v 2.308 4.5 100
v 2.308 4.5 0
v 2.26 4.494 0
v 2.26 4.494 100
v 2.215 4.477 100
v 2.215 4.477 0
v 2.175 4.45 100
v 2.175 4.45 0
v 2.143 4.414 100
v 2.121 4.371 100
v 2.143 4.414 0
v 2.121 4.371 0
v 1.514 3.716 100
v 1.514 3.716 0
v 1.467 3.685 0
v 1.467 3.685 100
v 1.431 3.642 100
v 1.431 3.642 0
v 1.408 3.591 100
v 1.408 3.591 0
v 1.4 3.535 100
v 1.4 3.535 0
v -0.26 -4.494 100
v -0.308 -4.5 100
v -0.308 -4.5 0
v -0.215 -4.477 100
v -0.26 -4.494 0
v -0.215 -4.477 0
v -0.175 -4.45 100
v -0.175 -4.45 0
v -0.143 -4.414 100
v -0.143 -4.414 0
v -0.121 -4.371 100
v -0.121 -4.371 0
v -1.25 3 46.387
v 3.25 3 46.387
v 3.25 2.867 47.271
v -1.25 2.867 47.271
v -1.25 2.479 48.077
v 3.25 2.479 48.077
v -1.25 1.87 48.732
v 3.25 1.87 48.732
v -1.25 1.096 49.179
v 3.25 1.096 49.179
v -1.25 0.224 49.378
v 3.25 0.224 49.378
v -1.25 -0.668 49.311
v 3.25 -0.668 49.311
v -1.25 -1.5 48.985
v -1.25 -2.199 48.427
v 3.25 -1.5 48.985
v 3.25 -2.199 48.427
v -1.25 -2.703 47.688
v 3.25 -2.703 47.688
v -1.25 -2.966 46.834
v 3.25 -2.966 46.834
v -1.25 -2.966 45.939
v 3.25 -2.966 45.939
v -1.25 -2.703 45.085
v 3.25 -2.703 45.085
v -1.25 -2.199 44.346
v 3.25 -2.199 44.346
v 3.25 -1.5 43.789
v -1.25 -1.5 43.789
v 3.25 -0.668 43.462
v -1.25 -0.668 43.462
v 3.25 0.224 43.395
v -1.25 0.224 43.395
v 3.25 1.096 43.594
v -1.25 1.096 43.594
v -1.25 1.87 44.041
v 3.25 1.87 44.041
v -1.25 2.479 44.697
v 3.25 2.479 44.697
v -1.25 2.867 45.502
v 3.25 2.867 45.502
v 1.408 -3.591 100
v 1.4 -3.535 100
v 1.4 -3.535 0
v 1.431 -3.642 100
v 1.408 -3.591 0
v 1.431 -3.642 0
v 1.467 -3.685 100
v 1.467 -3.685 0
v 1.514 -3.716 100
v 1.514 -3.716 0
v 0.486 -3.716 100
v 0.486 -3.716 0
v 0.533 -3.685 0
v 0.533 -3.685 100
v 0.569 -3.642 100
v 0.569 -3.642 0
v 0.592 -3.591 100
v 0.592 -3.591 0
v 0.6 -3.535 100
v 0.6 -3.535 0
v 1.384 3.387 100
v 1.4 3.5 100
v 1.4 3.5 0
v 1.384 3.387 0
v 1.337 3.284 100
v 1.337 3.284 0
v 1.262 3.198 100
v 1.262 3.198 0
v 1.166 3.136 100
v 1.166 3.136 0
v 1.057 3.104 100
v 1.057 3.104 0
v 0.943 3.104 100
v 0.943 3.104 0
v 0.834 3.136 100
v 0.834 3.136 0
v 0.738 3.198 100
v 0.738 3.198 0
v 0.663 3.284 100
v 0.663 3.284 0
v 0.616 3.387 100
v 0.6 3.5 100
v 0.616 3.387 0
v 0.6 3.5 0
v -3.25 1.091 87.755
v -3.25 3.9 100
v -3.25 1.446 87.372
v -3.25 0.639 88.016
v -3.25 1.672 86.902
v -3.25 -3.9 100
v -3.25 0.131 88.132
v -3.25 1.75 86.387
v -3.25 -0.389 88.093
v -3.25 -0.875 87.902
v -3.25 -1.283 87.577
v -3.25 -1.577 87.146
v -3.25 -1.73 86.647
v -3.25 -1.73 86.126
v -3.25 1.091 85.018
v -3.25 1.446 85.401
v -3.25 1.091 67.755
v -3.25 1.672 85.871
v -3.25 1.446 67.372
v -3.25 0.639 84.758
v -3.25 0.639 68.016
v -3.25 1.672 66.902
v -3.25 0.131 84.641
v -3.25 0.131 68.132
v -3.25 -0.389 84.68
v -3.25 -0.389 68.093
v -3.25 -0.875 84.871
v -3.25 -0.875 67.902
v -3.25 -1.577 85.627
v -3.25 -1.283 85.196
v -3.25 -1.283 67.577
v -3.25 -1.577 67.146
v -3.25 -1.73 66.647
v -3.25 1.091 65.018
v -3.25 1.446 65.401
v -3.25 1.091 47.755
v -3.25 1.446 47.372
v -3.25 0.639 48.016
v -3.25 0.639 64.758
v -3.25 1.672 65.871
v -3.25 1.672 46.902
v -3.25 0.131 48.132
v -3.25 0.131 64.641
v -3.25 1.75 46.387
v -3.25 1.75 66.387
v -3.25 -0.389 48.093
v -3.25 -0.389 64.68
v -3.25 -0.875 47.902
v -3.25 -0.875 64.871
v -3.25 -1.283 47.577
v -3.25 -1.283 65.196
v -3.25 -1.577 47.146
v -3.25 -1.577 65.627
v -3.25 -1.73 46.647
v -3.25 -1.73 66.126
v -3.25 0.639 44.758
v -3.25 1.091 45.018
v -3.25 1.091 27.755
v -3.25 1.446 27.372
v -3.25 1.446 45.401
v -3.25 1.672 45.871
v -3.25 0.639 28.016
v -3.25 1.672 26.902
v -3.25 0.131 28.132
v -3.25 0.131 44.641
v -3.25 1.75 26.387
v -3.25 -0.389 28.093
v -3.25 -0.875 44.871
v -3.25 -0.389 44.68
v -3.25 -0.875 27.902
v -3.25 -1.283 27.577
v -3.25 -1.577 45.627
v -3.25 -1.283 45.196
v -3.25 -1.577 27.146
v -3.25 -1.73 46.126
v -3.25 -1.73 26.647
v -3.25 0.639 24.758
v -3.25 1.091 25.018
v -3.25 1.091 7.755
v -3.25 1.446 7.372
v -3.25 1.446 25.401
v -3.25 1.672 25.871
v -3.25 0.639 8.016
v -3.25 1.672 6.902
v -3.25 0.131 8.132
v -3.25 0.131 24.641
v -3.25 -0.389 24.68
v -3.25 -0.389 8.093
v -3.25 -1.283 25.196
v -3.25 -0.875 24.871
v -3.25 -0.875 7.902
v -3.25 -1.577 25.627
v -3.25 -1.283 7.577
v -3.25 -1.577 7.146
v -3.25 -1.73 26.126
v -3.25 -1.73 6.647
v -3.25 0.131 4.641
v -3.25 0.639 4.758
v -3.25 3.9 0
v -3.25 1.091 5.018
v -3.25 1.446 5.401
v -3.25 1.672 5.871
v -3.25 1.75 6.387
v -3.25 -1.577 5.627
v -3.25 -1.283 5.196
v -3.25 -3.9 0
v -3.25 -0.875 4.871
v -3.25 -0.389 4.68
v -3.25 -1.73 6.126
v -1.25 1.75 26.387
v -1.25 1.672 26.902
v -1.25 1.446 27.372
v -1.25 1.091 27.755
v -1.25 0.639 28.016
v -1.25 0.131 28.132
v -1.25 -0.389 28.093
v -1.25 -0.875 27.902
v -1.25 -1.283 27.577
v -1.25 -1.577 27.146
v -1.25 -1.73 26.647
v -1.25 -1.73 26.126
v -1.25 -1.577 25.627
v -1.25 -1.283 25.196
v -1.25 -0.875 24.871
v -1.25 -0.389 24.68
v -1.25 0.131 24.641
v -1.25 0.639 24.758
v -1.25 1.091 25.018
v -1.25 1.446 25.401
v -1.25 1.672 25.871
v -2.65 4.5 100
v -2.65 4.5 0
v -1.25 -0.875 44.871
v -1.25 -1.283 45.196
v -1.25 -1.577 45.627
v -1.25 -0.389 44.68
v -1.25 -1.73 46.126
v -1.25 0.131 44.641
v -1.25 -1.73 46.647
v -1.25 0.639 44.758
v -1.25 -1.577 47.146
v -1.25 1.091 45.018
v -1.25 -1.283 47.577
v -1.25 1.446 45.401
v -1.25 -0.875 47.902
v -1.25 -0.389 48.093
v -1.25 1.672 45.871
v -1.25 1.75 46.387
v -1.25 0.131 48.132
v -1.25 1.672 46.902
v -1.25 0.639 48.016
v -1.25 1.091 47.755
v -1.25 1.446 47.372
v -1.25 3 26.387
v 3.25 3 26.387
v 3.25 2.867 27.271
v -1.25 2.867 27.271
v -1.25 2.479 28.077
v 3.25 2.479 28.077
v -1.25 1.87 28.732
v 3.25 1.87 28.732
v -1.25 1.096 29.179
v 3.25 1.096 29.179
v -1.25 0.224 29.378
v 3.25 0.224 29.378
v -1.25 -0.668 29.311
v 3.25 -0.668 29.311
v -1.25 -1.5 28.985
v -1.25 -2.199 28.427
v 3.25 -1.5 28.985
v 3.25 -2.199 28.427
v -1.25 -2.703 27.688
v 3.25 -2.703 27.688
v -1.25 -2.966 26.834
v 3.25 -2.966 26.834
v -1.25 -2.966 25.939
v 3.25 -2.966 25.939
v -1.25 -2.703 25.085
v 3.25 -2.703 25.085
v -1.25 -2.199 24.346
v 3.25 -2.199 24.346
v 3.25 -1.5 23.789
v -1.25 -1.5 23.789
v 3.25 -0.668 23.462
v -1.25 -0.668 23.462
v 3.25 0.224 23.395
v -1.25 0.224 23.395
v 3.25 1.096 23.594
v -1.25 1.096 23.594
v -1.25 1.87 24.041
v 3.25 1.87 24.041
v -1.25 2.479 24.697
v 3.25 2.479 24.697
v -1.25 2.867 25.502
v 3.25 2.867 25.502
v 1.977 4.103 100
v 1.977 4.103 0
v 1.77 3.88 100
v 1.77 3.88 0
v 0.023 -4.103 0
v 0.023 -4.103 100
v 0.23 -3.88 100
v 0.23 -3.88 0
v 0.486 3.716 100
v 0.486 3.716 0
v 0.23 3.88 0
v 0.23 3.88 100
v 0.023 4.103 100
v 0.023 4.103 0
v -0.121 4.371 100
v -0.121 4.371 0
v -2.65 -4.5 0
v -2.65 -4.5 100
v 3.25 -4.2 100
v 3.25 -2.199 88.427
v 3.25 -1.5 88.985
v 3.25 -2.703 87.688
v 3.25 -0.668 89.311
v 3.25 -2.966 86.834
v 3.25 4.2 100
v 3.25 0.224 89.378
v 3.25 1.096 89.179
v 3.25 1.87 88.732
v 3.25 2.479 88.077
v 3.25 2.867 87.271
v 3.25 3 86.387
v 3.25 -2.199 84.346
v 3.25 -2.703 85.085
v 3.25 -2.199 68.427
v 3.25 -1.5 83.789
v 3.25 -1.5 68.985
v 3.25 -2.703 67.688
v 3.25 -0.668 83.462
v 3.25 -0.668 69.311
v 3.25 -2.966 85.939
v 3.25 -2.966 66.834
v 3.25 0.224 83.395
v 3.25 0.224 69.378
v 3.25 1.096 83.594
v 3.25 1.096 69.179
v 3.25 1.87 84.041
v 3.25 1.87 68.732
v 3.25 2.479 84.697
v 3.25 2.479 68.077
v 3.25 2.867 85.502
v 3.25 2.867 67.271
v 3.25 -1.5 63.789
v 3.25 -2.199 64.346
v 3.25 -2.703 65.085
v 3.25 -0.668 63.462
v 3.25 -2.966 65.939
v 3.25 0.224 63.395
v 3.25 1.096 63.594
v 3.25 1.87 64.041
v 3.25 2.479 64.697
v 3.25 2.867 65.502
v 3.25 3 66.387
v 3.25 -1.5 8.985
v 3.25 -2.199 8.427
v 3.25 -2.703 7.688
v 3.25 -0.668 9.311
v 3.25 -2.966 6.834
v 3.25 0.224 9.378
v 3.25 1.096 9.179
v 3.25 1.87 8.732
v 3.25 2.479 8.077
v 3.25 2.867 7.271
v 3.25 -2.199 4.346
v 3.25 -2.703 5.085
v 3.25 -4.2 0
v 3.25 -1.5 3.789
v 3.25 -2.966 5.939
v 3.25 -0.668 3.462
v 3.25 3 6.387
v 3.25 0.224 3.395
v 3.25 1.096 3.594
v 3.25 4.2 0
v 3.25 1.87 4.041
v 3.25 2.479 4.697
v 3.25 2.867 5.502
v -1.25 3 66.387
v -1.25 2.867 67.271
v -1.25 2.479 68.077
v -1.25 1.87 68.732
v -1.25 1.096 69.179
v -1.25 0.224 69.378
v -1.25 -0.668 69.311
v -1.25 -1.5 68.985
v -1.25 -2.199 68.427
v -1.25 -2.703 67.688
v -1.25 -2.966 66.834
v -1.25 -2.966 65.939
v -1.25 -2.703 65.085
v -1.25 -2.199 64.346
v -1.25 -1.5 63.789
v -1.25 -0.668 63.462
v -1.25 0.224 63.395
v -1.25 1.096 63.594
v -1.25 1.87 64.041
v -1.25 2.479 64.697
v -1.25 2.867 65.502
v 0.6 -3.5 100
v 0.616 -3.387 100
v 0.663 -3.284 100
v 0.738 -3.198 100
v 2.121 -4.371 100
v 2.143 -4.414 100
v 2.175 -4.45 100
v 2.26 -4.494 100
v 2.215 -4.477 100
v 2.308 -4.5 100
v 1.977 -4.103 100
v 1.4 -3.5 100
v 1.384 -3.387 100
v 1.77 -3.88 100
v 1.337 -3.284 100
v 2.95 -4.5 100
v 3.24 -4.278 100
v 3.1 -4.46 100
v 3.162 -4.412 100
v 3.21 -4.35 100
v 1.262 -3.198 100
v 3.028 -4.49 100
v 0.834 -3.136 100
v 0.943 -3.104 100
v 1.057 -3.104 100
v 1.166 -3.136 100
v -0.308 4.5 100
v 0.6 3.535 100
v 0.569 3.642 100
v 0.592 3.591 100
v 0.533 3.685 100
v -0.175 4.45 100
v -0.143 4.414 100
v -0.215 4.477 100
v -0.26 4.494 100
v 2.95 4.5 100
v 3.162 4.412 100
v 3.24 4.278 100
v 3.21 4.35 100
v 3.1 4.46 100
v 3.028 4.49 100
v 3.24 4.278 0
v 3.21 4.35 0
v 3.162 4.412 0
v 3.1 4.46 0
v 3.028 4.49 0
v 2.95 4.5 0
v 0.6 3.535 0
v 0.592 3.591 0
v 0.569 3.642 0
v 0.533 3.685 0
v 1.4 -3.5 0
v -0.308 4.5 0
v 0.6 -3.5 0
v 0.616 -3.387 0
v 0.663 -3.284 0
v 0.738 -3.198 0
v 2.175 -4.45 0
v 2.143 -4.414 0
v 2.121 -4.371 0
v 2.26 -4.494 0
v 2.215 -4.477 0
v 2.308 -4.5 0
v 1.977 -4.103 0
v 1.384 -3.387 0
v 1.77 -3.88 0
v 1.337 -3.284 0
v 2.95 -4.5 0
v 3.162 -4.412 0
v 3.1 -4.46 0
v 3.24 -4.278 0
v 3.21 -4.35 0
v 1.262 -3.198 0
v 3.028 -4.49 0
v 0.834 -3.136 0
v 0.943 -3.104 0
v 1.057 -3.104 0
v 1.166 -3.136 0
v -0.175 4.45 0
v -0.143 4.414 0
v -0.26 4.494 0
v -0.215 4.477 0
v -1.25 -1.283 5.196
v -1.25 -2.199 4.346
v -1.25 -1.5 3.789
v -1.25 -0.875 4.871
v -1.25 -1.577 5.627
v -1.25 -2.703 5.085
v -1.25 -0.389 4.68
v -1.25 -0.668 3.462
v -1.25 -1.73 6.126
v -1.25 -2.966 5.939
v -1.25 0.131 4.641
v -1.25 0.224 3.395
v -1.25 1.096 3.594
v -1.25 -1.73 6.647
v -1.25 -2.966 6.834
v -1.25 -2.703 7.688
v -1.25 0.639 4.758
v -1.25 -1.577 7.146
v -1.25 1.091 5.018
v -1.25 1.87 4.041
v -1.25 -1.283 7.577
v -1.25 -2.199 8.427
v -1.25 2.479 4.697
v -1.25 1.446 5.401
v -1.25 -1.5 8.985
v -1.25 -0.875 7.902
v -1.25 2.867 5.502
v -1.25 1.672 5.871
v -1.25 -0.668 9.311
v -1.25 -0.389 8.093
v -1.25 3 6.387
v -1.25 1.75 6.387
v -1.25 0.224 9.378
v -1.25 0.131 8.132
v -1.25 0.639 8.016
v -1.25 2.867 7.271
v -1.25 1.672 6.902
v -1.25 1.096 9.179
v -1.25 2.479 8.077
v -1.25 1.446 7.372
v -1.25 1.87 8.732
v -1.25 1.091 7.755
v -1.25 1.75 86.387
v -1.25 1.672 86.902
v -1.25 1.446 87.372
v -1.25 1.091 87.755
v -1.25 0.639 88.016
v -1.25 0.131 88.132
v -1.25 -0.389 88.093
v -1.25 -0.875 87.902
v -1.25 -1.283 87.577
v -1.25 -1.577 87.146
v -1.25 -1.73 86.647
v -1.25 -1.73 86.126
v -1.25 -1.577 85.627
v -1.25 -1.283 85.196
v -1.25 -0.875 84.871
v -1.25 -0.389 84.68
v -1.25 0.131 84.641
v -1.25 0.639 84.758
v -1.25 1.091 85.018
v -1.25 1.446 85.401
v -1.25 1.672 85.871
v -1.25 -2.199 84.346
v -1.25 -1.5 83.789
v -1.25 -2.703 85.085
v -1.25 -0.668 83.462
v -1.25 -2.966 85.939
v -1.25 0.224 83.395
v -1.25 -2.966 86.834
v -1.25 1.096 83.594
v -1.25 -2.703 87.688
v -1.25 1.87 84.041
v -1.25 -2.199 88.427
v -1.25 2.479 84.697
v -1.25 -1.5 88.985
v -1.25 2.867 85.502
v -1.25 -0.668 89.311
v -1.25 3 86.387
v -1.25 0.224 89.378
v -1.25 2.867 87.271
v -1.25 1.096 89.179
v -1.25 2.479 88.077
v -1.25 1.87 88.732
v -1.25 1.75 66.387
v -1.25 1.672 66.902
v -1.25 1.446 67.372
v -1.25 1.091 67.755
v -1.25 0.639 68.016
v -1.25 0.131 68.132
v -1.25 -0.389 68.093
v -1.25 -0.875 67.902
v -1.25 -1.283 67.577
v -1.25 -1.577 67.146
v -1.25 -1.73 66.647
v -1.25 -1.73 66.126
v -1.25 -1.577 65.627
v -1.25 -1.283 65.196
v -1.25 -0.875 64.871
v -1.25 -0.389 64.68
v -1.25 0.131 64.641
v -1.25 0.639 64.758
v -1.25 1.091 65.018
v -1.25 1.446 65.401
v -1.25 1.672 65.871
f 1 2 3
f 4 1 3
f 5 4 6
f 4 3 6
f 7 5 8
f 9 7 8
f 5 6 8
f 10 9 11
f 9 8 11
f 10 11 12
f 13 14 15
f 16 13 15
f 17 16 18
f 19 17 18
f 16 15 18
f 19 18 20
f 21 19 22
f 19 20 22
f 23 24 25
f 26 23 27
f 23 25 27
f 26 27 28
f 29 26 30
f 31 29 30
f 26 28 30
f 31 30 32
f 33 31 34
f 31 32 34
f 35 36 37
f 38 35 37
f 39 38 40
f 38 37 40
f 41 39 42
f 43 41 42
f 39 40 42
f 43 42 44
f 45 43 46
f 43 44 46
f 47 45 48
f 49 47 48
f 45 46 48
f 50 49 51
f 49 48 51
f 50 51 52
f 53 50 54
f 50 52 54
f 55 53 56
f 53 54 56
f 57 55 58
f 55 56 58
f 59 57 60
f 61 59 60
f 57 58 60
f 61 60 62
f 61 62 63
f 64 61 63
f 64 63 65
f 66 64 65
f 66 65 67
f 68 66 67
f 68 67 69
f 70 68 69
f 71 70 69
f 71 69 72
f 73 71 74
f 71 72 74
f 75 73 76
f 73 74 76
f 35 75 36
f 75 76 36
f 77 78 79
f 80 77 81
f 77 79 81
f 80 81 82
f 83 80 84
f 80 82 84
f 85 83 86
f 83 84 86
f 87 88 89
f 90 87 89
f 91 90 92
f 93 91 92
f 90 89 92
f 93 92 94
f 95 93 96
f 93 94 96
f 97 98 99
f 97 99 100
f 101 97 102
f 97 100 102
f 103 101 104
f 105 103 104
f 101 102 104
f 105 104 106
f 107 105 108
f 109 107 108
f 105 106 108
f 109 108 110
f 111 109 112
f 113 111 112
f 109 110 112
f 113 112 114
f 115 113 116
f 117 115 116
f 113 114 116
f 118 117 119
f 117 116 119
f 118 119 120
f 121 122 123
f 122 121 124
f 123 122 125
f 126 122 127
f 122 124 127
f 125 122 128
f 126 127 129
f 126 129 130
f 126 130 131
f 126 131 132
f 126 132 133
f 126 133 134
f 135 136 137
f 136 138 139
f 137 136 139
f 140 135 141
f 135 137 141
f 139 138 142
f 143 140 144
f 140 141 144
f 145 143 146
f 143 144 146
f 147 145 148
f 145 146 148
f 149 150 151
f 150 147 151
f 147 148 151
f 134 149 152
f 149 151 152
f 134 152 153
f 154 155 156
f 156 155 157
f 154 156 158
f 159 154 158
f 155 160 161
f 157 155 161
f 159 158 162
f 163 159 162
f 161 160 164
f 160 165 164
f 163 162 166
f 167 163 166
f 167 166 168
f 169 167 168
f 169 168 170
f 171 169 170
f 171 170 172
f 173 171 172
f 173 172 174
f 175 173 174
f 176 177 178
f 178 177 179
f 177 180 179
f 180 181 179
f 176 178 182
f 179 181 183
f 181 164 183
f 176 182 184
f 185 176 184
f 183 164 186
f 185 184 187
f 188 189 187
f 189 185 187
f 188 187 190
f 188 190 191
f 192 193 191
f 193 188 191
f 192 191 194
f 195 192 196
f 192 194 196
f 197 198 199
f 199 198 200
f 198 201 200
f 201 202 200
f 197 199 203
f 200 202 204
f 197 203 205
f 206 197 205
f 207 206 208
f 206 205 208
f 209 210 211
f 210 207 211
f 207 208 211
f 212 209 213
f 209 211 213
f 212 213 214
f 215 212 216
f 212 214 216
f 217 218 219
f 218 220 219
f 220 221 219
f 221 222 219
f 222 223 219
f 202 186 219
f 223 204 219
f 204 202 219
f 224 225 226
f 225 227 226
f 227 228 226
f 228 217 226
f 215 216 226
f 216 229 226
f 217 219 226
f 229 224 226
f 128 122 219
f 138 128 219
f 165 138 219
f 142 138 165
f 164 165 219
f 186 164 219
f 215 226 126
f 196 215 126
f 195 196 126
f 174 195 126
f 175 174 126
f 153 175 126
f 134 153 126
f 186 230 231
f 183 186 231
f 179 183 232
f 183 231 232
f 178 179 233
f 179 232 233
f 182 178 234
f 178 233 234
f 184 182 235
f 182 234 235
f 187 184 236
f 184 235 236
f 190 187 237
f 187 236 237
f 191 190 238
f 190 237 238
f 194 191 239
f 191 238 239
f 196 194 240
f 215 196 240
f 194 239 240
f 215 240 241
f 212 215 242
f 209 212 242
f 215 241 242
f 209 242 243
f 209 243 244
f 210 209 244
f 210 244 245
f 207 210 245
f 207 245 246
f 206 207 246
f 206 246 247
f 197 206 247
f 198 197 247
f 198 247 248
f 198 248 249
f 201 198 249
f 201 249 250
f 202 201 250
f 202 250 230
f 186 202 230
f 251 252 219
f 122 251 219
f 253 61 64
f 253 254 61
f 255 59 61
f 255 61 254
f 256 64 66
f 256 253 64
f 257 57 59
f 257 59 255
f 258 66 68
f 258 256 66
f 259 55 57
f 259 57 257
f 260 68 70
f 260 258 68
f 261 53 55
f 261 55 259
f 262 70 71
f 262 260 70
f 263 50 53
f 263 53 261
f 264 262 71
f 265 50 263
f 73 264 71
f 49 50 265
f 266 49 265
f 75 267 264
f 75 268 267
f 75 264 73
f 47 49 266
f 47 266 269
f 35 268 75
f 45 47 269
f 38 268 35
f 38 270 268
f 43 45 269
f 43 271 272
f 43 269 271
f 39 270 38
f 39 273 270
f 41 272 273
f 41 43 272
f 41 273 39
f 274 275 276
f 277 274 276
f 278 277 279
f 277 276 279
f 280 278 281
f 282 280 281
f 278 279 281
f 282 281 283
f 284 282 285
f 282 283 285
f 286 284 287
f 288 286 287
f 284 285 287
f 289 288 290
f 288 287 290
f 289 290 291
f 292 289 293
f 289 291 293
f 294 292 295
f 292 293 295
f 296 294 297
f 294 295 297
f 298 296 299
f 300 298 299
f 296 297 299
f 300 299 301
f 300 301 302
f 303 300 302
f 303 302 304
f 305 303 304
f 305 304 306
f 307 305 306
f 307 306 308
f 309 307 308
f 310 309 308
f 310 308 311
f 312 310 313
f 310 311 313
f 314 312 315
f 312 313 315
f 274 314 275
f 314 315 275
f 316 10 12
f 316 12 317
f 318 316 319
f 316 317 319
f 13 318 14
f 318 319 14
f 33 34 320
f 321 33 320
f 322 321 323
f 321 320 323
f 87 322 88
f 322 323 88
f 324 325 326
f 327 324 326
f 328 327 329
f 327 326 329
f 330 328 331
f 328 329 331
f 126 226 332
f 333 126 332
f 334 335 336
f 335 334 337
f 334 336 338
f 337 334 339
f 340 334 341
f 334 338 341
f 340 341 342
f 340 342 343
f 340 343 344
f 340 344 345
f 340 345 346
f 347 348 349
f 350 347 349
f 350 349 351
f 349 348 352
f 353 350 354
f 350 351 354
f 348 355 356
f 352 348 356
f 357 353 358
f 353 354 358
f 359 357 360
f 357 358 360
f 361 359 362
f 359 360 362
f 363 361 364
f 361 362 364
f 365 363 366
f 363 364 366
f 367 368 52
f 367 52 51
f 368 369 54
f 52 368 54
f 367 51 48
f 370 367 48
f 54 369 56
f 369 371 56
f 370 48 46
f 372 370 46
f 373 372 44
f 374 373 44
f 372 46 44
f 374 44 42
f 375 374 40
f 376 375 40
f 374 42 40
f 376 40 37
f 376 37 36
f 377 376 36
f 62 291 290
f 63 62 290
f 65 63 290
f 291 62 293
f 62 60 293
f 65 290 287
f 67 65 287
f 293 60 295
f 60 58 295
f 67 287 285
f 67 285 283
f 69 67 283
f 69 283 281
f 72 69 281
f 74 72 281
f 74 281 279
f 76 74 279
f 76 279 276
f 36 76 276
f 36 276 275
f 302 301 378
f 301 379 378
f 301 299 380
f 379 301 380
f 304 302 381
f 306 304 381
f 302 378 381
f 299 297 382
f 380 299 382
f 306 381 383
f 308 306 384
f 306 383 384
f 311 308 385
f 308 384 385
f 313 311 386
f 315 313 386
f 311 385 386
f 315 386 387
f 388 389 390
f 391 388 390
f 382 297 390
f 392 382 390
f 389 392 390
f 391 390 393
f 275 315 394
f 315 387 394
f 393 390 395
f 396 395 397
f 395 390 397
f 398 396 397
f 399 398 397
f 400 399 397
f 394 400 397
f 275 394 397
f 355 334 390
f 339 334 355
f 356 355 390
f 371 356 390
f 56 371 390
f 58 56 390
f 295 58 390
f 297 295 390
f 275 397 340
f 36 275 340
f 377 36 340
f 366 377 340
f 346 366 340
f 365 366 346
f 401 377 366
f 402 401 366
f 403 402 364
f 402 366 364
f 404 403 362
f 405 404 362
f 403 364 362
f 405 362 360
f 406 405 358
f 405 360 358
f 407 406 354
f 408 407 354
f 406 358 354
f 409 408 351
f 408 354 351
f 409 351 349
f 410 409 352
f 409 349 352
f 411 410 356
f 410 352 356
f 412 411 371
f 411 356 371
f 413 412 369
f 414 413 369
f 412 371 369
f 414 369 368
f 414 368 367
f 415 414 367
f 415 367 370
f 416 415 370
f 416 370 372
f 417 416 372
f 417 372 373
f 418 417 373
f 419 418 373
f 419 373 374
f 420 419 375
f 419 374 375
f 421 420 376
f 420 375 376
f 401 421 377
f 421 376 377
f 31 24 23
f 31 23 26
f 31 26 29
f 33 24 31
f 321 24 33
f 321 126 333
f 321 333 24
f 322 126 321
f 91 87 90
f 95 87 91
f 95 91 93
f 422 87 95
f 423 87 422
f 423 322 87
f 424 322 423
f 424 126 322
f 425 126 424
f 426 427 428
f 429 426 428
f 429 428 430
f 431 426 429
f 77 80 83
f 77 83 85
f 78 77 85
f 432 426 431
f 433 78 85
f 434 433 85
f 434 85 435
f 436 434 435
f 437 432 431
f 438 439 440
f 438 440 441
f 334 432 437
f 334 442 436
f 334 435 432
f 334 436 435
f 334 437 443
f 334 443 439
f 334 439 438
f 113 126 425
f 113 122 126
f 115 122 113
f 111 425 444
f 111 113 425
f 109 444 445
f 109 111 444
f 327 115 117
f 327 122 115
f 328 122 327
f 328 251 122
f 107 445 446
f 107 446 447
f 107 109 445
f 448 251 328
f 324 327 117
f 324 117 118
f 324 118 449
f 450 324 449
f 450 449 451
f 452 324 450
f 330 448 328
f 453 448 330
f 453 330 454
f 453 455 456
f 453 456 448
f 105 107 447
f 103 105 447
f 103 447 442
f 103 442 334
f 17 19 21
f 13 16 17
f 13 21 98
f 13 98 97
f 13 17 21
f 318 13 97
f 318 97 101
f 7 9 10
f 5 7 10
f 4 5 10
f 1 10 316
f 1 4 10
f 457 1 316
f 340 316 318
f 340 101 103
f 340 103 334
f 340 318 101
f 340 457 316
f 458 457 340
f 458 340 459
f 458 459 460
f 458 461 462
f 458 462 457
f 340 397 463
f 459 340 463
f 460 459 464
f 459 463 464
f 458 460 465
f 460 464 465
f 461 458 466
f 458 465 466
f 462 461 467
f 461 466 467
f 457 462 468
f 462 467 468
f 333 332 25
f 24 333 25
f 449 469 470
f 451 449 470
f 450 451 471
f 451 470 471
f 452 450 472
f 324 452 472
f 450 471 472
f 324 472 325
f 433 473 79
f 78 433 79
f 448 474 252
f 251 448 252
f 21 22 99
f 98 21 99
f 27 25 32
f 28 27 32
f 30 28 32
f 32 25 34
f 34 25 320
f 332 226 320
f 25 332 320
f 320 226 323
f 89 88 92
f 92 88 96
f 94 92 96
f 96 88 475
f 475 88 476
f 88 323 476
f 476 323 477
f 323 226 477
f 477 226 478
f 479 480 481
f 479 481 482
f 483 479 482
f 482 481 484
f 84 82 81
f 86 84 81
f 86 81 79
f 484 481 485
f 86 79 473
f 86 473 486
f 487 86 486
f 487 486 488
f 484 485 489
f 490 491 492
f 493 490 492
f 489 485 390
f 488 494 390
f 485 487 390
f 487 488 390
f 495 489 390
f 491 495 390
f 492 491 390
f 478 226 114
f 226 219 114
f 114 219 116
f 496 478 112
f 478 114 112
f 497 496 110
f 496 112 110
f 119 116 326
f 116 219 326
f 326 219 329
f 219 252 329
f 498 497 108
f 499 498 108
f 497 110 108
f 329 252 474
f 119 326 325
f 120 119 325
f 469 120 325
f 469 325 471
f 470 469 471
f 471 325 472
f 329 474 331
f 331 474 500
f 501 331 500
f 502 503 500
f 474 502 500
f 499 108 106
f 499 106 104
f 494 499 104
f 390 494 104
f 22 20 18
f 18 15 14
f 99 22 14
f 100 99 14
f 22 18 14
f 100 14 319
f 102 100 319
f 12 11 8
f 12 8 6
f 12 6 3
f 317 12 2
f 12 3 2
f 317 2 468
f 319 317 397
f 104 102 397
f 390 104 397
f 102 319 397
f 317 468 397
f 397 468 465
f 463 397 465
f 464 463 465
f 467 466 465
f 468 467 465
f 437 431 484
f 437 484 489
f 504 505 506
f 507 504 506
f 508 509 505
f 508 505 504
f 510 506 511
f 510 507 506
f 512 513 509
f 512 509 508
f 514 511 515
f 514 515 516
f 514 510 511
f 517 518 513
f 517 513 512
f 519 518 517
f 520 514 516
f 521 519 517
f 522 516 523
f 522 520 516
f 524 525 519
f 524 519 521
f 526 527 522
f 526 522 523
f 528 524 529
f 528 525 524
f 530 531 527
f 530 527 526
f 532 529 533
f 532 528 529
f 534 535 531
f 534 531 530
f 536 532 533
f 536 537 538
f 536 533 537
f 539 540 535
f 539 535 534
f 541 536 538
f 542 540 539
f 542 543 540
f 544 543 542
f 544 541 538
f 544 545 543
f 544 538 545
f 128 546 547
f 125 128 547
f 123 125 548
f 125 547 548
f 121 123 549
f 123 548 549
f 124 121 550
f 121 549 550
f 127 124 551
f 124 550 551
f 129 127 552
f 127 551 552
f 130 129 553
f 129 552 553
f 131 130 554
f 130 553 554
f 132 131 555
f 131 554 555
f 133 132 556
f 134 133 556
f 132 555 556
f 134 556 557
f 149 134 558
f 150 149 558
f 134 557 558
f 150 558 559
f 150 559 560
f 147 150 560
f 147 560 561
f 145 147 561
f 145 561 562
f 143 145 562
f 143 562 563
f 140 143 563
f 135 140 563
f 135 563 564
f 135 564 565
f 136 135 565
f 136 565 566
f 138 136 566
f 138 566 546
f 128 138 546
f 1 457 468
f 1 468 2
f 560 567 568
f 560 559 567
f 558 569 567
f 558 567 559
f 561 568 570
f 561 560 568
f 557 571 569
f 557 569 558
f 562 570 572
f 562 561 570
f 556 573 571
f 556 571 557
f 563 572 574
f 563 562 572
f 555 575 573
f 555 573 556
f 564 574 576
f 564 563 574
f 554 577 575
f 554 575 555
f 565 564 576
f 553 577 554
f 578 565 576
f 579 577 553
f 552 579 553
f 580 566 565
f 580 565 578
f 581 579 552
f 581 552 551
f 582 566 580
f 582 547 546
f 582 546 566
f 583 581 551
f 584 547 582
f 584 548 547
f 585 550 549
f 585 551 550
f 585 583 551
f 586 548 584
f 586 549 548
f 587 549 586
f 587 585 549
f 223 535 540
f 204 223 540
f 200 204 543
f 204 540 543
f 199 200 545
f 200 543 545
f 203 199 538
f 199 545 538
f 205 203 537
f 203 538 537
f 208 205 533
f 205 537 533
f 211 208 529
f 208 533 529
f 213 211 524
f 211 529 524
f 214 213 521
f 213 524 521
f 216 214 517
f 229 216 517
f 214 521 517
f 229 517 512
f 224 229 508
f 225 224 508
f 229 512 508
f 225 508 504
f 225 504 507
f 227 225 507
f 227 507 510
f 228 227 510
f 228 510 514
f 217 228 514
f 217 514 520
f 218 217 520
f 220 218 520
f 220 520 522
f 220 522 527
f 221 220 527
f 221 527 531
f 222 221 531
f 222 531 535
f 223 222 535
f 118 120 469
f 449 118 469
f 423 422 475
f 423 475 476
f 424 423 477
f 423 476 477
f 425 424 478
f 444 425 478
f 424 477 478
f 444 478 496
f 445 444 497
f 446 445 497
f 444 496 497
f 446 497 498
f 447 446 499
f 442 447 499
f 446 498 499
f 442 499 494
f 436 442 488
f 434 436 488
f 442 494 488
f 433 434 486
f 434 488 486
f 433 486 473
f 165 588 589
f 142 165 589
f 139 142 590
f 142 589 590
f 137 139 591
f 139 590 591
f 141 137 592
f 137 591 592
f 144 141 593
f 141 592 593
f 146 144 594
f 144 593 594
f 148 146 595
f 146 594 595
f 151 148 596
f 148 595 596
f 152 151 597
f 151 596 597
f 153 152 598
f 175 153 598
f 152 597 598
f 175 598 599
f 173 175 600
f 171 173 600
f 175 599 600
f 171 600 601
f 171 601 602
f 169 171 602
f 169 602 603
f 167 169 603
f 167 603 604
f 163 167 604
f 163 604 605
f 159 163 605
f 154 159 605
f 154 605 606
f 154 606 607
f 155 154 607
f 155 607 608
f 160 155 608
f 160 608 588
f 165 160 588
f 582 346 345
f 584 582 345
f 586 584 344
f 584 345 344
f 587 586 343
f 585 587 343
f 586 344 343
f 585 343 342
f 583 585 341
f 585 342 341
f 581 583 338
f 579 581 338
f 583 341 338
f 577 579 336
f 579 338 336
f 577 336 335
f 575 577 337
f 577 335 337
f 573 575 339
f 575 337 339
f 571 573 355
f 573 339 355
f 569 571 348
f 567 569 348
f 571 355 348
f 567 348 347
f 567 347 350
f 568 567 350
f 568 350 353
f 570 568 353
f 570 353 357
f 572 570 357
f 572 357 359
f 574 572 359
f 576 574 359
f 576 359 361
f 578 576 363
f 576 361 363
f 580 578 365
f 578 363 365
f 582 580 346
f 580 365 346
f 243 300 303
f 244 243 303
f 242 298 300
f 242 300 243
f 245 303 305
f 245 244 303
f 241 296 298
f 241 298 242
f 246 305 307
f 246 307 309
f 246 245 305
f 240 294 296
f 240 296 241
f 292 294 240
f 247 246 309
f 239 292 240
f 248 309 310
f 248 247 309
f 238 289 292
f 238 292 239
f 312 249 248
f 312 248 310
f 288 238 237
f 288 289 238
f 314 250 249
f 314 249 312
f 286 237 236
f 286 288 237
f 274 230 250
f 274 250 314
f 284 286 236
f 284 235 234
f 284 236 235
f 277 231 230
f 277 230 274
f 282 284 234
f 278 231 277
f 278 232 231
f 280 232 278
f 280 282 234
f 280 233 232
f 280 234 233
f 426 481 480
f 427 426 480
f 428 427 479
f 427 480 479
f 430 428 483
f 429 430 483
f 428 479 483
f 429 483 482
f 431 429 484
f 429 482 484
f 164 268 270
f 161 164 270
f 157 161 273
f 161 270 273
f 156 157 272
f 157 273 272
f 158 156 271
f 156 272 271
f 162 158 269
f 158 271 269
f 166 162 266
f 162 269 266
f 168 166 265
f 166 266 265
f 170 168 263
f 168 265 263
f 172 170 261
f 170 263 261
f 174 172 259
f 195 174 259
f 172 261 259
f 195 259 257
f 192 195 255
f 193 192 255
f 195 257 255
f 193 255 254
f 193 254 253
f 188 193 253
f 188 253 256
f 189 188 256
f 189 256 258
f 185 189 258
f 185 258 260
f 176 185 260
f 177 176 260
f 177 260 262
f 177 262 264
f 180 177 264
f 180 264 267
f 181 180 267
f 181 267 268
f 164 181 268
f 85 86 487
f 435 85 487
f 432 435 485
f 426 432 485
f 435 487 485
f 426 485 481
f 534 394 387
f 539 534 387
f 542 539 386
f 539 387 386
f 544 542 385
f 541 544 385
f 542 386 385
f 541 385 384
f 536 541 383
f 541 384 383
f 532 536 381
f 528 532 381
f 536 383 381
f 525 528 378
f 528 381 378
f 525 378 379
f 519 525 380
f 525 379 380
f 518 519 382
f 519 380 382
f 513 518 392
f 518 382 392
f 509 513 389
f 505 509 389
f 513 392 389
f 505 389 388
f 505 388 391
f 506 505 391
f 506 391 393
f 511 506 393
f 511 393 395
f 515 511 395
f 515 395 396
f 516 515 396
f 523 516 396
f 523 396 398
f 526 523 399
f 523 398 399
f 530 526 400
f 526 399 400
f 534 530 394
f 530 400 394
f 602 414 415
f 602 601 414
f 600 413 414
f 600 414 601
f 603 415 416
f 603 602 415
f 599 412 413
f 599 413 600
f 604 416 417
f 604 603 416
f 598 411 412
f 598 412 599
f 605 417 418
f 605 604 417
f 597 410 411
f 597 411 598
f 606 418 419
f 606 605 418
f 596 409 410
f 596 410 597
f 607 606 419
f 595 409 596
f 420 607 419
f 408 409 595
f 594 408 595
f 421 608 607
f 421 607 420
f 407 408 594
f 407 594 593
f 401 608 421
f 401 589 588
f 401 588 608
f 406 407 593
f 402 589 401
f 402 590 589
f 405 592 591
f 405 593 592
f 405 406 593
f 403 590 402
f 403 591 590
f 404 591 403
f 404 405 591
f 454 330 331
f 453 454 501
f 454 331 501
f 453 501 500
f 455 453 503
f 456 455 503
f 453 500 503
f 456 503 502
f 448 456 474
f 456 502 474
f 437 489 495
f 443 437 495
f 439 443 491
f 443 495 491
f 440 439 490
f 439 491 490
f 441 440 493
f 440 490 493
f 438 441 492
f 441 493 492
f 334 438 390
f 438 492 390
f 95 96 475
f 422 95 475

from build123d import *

# Parameters (mm, degrees)
EXTRUDE_1_DEPTH     = 100
SKETCH_2_R          = 1.75
CUT_EXTRUDE_1_DEPTH = 100
SKETCH_3_R          = 3
CUT_EXTRUDE_2_DEPTH = 4.5


with BuildPart() as part:
    # 草图1 → 凸台-拉伸1 (new body)
    with BuildSketch(Plane.XY):
        with BuildLine():
            Line((2.95, 4.5), (2.307669683, 4.5))
            ThreePointArc((2.307669683, 4.5), (2.194280341, 4.464750894), (2.120859728, 4.371428571))
            ThreePointArc((2.120859728, 4.371428571), (1.880846451, 3.985070843), (1.514285714, 3.715790517))
            ThreePointArc((1.514285714, 3.715790517), (1.430969149, 3.641993433), (1.4, 3.535088936))
            Line((1.4, 3.535088936), (1.4, 3.5))
            ThreePointArc((1.4, 3.5), (1, 3.1), (0.6, 3.5))
            Line((0.6, 3.5), (0.6, 3.535088936))
            ThreePointArc((0.6, 3.535088936), (0.569030851, 3.641993433), (0.485714286, 3.715790517))
            ThreePointArc((0.485714286, 3.715790517), (0.119153549, 3.985070843), (-0.120859728, 4.371428571))
            ThreePointArc((-0.120859728, 4.371428571), (-0.194280341, 4.464750894), (-0.307669683, 4.5))
            Line((-0.307669683, 4.5), (-2.65, 4.5))
            Line((-2.65, 4.5), (-3.25, 3.9))
            Line((-3.25, 3.9), (-3.25, -3.9))
            Line((-3.25, -3.9), (-2.65, -4.5))
            Line((-2.65, -4.5), (-0.307669683, -4.5))
            ThreePointArc((-0.307669683, -4.5), (-0.194280341, -4.464750894), (-0.120859728, -4.371428571))
            ThreePointArc((-0.120859728, -4.371428571), (0.119153549, -3.985070843), (0.485714286, -3.715790517))
            ThreePointArc((0.485714286, -3.715790517), (0.569030851, -3.641993433), (0.6, -3.535088936))
            Line((0.6, -3.535088936), (0.6, -3.5))
            ThreePointArc((0.6, -3.5), (1, -3.1), (1.4, -3.5))
            Line((1.4, -3.5), (1.4, -3.535088936))
            ThreePointArc((1.4, -3.535088936), (1.430969149, -3.641993433), (1.514285714, -3.715790517))
            ThreePointArc((1.514285714, -3.715790517), (1.880846451, -3.985070843), (2.120859728, -4.371428571))
            ThreePointArc((2.120859728, -4.371428571), (2.194280341, -4.464750894), (2.307669683, -4.5))
            Line((2.307669683, -4.5), (2.95, -4.5))
            ThreePointArc((2.95, -4.5), (3.162132034, -4.412132034), (3.25, -4.2))
            Line((3.25, -4.2), (3.25, 4.2))
            ThreePointArc((3.25, 4.2), (3.162132034, 4.412132034), (2.95, 4.5))
        make_face()
    extrude(amount=EXTRUDE_1_DEPTH)

    # 草图2 → 切除-拉伸1 (cut)
    with BuildSketch(Plane(origin=(3.25, 0, 0), x_dir=(0, 0, -1), z_dir=(1, 0, 0))):
        with Locations(Location((-6.386586206, 0, 0), (0, 0, 90))):
            Circle(SKETCH_2_R)
        with Locations(Location((-26.386586206, 0, 0), (0, 0, 90))):
            Circle(SKETCH_2_R)
        with Locations(Location((-46.386586206, 0, 0), (0, 0, 90))):
            Circle(SKETCH_2_R)
        with Locations(Location((-66.386586206, 0, 0), (0, 0, 90))):
            Circle(SKETCH_2_R)
        with Locations(Location((-86.386586206, 0, 0), (0, 0, 90))):
            Circle(SKETCH_2_R)
    extrude(amount=-CUT_EXTRUDE_1_DEPTH, mode=Mode.SUBTRACT)

    # 草图3 → 切除-拉伸2 (cut)
    with BuildSketch(Plane(origin=(3.25, 0, 0), x_dir=(0, 0, -1), z_dir=(1, 0, 0))):
        with Locations(Location((-6.386586206, 0, 0), (0, 0, 90))):
            Circle(SKETCH_3_R)
        with Locations(Location((-26.386586206, 0, 0), (0, 0, 90))):
            Circle(SKETCH_3_R)
        with Locations(Location((-46.386586206, 0, 0), (0, 0, 90))):
            Circle(SKETCH_3_R)
        with Locations(Location((-66.386586206, 0, 0), (0, 0, 90))):
            Circle(SKETCH_3_R)
        with Locations(Location((-86.386586206, 0, 0), (0, 0, 90))):
            Circle(SKETCH_3_R)
    extrude(amount=-CUT_EXTRUDE_2_DEPTH, mode=Mode.SUBTRACT)


solid = part.part
